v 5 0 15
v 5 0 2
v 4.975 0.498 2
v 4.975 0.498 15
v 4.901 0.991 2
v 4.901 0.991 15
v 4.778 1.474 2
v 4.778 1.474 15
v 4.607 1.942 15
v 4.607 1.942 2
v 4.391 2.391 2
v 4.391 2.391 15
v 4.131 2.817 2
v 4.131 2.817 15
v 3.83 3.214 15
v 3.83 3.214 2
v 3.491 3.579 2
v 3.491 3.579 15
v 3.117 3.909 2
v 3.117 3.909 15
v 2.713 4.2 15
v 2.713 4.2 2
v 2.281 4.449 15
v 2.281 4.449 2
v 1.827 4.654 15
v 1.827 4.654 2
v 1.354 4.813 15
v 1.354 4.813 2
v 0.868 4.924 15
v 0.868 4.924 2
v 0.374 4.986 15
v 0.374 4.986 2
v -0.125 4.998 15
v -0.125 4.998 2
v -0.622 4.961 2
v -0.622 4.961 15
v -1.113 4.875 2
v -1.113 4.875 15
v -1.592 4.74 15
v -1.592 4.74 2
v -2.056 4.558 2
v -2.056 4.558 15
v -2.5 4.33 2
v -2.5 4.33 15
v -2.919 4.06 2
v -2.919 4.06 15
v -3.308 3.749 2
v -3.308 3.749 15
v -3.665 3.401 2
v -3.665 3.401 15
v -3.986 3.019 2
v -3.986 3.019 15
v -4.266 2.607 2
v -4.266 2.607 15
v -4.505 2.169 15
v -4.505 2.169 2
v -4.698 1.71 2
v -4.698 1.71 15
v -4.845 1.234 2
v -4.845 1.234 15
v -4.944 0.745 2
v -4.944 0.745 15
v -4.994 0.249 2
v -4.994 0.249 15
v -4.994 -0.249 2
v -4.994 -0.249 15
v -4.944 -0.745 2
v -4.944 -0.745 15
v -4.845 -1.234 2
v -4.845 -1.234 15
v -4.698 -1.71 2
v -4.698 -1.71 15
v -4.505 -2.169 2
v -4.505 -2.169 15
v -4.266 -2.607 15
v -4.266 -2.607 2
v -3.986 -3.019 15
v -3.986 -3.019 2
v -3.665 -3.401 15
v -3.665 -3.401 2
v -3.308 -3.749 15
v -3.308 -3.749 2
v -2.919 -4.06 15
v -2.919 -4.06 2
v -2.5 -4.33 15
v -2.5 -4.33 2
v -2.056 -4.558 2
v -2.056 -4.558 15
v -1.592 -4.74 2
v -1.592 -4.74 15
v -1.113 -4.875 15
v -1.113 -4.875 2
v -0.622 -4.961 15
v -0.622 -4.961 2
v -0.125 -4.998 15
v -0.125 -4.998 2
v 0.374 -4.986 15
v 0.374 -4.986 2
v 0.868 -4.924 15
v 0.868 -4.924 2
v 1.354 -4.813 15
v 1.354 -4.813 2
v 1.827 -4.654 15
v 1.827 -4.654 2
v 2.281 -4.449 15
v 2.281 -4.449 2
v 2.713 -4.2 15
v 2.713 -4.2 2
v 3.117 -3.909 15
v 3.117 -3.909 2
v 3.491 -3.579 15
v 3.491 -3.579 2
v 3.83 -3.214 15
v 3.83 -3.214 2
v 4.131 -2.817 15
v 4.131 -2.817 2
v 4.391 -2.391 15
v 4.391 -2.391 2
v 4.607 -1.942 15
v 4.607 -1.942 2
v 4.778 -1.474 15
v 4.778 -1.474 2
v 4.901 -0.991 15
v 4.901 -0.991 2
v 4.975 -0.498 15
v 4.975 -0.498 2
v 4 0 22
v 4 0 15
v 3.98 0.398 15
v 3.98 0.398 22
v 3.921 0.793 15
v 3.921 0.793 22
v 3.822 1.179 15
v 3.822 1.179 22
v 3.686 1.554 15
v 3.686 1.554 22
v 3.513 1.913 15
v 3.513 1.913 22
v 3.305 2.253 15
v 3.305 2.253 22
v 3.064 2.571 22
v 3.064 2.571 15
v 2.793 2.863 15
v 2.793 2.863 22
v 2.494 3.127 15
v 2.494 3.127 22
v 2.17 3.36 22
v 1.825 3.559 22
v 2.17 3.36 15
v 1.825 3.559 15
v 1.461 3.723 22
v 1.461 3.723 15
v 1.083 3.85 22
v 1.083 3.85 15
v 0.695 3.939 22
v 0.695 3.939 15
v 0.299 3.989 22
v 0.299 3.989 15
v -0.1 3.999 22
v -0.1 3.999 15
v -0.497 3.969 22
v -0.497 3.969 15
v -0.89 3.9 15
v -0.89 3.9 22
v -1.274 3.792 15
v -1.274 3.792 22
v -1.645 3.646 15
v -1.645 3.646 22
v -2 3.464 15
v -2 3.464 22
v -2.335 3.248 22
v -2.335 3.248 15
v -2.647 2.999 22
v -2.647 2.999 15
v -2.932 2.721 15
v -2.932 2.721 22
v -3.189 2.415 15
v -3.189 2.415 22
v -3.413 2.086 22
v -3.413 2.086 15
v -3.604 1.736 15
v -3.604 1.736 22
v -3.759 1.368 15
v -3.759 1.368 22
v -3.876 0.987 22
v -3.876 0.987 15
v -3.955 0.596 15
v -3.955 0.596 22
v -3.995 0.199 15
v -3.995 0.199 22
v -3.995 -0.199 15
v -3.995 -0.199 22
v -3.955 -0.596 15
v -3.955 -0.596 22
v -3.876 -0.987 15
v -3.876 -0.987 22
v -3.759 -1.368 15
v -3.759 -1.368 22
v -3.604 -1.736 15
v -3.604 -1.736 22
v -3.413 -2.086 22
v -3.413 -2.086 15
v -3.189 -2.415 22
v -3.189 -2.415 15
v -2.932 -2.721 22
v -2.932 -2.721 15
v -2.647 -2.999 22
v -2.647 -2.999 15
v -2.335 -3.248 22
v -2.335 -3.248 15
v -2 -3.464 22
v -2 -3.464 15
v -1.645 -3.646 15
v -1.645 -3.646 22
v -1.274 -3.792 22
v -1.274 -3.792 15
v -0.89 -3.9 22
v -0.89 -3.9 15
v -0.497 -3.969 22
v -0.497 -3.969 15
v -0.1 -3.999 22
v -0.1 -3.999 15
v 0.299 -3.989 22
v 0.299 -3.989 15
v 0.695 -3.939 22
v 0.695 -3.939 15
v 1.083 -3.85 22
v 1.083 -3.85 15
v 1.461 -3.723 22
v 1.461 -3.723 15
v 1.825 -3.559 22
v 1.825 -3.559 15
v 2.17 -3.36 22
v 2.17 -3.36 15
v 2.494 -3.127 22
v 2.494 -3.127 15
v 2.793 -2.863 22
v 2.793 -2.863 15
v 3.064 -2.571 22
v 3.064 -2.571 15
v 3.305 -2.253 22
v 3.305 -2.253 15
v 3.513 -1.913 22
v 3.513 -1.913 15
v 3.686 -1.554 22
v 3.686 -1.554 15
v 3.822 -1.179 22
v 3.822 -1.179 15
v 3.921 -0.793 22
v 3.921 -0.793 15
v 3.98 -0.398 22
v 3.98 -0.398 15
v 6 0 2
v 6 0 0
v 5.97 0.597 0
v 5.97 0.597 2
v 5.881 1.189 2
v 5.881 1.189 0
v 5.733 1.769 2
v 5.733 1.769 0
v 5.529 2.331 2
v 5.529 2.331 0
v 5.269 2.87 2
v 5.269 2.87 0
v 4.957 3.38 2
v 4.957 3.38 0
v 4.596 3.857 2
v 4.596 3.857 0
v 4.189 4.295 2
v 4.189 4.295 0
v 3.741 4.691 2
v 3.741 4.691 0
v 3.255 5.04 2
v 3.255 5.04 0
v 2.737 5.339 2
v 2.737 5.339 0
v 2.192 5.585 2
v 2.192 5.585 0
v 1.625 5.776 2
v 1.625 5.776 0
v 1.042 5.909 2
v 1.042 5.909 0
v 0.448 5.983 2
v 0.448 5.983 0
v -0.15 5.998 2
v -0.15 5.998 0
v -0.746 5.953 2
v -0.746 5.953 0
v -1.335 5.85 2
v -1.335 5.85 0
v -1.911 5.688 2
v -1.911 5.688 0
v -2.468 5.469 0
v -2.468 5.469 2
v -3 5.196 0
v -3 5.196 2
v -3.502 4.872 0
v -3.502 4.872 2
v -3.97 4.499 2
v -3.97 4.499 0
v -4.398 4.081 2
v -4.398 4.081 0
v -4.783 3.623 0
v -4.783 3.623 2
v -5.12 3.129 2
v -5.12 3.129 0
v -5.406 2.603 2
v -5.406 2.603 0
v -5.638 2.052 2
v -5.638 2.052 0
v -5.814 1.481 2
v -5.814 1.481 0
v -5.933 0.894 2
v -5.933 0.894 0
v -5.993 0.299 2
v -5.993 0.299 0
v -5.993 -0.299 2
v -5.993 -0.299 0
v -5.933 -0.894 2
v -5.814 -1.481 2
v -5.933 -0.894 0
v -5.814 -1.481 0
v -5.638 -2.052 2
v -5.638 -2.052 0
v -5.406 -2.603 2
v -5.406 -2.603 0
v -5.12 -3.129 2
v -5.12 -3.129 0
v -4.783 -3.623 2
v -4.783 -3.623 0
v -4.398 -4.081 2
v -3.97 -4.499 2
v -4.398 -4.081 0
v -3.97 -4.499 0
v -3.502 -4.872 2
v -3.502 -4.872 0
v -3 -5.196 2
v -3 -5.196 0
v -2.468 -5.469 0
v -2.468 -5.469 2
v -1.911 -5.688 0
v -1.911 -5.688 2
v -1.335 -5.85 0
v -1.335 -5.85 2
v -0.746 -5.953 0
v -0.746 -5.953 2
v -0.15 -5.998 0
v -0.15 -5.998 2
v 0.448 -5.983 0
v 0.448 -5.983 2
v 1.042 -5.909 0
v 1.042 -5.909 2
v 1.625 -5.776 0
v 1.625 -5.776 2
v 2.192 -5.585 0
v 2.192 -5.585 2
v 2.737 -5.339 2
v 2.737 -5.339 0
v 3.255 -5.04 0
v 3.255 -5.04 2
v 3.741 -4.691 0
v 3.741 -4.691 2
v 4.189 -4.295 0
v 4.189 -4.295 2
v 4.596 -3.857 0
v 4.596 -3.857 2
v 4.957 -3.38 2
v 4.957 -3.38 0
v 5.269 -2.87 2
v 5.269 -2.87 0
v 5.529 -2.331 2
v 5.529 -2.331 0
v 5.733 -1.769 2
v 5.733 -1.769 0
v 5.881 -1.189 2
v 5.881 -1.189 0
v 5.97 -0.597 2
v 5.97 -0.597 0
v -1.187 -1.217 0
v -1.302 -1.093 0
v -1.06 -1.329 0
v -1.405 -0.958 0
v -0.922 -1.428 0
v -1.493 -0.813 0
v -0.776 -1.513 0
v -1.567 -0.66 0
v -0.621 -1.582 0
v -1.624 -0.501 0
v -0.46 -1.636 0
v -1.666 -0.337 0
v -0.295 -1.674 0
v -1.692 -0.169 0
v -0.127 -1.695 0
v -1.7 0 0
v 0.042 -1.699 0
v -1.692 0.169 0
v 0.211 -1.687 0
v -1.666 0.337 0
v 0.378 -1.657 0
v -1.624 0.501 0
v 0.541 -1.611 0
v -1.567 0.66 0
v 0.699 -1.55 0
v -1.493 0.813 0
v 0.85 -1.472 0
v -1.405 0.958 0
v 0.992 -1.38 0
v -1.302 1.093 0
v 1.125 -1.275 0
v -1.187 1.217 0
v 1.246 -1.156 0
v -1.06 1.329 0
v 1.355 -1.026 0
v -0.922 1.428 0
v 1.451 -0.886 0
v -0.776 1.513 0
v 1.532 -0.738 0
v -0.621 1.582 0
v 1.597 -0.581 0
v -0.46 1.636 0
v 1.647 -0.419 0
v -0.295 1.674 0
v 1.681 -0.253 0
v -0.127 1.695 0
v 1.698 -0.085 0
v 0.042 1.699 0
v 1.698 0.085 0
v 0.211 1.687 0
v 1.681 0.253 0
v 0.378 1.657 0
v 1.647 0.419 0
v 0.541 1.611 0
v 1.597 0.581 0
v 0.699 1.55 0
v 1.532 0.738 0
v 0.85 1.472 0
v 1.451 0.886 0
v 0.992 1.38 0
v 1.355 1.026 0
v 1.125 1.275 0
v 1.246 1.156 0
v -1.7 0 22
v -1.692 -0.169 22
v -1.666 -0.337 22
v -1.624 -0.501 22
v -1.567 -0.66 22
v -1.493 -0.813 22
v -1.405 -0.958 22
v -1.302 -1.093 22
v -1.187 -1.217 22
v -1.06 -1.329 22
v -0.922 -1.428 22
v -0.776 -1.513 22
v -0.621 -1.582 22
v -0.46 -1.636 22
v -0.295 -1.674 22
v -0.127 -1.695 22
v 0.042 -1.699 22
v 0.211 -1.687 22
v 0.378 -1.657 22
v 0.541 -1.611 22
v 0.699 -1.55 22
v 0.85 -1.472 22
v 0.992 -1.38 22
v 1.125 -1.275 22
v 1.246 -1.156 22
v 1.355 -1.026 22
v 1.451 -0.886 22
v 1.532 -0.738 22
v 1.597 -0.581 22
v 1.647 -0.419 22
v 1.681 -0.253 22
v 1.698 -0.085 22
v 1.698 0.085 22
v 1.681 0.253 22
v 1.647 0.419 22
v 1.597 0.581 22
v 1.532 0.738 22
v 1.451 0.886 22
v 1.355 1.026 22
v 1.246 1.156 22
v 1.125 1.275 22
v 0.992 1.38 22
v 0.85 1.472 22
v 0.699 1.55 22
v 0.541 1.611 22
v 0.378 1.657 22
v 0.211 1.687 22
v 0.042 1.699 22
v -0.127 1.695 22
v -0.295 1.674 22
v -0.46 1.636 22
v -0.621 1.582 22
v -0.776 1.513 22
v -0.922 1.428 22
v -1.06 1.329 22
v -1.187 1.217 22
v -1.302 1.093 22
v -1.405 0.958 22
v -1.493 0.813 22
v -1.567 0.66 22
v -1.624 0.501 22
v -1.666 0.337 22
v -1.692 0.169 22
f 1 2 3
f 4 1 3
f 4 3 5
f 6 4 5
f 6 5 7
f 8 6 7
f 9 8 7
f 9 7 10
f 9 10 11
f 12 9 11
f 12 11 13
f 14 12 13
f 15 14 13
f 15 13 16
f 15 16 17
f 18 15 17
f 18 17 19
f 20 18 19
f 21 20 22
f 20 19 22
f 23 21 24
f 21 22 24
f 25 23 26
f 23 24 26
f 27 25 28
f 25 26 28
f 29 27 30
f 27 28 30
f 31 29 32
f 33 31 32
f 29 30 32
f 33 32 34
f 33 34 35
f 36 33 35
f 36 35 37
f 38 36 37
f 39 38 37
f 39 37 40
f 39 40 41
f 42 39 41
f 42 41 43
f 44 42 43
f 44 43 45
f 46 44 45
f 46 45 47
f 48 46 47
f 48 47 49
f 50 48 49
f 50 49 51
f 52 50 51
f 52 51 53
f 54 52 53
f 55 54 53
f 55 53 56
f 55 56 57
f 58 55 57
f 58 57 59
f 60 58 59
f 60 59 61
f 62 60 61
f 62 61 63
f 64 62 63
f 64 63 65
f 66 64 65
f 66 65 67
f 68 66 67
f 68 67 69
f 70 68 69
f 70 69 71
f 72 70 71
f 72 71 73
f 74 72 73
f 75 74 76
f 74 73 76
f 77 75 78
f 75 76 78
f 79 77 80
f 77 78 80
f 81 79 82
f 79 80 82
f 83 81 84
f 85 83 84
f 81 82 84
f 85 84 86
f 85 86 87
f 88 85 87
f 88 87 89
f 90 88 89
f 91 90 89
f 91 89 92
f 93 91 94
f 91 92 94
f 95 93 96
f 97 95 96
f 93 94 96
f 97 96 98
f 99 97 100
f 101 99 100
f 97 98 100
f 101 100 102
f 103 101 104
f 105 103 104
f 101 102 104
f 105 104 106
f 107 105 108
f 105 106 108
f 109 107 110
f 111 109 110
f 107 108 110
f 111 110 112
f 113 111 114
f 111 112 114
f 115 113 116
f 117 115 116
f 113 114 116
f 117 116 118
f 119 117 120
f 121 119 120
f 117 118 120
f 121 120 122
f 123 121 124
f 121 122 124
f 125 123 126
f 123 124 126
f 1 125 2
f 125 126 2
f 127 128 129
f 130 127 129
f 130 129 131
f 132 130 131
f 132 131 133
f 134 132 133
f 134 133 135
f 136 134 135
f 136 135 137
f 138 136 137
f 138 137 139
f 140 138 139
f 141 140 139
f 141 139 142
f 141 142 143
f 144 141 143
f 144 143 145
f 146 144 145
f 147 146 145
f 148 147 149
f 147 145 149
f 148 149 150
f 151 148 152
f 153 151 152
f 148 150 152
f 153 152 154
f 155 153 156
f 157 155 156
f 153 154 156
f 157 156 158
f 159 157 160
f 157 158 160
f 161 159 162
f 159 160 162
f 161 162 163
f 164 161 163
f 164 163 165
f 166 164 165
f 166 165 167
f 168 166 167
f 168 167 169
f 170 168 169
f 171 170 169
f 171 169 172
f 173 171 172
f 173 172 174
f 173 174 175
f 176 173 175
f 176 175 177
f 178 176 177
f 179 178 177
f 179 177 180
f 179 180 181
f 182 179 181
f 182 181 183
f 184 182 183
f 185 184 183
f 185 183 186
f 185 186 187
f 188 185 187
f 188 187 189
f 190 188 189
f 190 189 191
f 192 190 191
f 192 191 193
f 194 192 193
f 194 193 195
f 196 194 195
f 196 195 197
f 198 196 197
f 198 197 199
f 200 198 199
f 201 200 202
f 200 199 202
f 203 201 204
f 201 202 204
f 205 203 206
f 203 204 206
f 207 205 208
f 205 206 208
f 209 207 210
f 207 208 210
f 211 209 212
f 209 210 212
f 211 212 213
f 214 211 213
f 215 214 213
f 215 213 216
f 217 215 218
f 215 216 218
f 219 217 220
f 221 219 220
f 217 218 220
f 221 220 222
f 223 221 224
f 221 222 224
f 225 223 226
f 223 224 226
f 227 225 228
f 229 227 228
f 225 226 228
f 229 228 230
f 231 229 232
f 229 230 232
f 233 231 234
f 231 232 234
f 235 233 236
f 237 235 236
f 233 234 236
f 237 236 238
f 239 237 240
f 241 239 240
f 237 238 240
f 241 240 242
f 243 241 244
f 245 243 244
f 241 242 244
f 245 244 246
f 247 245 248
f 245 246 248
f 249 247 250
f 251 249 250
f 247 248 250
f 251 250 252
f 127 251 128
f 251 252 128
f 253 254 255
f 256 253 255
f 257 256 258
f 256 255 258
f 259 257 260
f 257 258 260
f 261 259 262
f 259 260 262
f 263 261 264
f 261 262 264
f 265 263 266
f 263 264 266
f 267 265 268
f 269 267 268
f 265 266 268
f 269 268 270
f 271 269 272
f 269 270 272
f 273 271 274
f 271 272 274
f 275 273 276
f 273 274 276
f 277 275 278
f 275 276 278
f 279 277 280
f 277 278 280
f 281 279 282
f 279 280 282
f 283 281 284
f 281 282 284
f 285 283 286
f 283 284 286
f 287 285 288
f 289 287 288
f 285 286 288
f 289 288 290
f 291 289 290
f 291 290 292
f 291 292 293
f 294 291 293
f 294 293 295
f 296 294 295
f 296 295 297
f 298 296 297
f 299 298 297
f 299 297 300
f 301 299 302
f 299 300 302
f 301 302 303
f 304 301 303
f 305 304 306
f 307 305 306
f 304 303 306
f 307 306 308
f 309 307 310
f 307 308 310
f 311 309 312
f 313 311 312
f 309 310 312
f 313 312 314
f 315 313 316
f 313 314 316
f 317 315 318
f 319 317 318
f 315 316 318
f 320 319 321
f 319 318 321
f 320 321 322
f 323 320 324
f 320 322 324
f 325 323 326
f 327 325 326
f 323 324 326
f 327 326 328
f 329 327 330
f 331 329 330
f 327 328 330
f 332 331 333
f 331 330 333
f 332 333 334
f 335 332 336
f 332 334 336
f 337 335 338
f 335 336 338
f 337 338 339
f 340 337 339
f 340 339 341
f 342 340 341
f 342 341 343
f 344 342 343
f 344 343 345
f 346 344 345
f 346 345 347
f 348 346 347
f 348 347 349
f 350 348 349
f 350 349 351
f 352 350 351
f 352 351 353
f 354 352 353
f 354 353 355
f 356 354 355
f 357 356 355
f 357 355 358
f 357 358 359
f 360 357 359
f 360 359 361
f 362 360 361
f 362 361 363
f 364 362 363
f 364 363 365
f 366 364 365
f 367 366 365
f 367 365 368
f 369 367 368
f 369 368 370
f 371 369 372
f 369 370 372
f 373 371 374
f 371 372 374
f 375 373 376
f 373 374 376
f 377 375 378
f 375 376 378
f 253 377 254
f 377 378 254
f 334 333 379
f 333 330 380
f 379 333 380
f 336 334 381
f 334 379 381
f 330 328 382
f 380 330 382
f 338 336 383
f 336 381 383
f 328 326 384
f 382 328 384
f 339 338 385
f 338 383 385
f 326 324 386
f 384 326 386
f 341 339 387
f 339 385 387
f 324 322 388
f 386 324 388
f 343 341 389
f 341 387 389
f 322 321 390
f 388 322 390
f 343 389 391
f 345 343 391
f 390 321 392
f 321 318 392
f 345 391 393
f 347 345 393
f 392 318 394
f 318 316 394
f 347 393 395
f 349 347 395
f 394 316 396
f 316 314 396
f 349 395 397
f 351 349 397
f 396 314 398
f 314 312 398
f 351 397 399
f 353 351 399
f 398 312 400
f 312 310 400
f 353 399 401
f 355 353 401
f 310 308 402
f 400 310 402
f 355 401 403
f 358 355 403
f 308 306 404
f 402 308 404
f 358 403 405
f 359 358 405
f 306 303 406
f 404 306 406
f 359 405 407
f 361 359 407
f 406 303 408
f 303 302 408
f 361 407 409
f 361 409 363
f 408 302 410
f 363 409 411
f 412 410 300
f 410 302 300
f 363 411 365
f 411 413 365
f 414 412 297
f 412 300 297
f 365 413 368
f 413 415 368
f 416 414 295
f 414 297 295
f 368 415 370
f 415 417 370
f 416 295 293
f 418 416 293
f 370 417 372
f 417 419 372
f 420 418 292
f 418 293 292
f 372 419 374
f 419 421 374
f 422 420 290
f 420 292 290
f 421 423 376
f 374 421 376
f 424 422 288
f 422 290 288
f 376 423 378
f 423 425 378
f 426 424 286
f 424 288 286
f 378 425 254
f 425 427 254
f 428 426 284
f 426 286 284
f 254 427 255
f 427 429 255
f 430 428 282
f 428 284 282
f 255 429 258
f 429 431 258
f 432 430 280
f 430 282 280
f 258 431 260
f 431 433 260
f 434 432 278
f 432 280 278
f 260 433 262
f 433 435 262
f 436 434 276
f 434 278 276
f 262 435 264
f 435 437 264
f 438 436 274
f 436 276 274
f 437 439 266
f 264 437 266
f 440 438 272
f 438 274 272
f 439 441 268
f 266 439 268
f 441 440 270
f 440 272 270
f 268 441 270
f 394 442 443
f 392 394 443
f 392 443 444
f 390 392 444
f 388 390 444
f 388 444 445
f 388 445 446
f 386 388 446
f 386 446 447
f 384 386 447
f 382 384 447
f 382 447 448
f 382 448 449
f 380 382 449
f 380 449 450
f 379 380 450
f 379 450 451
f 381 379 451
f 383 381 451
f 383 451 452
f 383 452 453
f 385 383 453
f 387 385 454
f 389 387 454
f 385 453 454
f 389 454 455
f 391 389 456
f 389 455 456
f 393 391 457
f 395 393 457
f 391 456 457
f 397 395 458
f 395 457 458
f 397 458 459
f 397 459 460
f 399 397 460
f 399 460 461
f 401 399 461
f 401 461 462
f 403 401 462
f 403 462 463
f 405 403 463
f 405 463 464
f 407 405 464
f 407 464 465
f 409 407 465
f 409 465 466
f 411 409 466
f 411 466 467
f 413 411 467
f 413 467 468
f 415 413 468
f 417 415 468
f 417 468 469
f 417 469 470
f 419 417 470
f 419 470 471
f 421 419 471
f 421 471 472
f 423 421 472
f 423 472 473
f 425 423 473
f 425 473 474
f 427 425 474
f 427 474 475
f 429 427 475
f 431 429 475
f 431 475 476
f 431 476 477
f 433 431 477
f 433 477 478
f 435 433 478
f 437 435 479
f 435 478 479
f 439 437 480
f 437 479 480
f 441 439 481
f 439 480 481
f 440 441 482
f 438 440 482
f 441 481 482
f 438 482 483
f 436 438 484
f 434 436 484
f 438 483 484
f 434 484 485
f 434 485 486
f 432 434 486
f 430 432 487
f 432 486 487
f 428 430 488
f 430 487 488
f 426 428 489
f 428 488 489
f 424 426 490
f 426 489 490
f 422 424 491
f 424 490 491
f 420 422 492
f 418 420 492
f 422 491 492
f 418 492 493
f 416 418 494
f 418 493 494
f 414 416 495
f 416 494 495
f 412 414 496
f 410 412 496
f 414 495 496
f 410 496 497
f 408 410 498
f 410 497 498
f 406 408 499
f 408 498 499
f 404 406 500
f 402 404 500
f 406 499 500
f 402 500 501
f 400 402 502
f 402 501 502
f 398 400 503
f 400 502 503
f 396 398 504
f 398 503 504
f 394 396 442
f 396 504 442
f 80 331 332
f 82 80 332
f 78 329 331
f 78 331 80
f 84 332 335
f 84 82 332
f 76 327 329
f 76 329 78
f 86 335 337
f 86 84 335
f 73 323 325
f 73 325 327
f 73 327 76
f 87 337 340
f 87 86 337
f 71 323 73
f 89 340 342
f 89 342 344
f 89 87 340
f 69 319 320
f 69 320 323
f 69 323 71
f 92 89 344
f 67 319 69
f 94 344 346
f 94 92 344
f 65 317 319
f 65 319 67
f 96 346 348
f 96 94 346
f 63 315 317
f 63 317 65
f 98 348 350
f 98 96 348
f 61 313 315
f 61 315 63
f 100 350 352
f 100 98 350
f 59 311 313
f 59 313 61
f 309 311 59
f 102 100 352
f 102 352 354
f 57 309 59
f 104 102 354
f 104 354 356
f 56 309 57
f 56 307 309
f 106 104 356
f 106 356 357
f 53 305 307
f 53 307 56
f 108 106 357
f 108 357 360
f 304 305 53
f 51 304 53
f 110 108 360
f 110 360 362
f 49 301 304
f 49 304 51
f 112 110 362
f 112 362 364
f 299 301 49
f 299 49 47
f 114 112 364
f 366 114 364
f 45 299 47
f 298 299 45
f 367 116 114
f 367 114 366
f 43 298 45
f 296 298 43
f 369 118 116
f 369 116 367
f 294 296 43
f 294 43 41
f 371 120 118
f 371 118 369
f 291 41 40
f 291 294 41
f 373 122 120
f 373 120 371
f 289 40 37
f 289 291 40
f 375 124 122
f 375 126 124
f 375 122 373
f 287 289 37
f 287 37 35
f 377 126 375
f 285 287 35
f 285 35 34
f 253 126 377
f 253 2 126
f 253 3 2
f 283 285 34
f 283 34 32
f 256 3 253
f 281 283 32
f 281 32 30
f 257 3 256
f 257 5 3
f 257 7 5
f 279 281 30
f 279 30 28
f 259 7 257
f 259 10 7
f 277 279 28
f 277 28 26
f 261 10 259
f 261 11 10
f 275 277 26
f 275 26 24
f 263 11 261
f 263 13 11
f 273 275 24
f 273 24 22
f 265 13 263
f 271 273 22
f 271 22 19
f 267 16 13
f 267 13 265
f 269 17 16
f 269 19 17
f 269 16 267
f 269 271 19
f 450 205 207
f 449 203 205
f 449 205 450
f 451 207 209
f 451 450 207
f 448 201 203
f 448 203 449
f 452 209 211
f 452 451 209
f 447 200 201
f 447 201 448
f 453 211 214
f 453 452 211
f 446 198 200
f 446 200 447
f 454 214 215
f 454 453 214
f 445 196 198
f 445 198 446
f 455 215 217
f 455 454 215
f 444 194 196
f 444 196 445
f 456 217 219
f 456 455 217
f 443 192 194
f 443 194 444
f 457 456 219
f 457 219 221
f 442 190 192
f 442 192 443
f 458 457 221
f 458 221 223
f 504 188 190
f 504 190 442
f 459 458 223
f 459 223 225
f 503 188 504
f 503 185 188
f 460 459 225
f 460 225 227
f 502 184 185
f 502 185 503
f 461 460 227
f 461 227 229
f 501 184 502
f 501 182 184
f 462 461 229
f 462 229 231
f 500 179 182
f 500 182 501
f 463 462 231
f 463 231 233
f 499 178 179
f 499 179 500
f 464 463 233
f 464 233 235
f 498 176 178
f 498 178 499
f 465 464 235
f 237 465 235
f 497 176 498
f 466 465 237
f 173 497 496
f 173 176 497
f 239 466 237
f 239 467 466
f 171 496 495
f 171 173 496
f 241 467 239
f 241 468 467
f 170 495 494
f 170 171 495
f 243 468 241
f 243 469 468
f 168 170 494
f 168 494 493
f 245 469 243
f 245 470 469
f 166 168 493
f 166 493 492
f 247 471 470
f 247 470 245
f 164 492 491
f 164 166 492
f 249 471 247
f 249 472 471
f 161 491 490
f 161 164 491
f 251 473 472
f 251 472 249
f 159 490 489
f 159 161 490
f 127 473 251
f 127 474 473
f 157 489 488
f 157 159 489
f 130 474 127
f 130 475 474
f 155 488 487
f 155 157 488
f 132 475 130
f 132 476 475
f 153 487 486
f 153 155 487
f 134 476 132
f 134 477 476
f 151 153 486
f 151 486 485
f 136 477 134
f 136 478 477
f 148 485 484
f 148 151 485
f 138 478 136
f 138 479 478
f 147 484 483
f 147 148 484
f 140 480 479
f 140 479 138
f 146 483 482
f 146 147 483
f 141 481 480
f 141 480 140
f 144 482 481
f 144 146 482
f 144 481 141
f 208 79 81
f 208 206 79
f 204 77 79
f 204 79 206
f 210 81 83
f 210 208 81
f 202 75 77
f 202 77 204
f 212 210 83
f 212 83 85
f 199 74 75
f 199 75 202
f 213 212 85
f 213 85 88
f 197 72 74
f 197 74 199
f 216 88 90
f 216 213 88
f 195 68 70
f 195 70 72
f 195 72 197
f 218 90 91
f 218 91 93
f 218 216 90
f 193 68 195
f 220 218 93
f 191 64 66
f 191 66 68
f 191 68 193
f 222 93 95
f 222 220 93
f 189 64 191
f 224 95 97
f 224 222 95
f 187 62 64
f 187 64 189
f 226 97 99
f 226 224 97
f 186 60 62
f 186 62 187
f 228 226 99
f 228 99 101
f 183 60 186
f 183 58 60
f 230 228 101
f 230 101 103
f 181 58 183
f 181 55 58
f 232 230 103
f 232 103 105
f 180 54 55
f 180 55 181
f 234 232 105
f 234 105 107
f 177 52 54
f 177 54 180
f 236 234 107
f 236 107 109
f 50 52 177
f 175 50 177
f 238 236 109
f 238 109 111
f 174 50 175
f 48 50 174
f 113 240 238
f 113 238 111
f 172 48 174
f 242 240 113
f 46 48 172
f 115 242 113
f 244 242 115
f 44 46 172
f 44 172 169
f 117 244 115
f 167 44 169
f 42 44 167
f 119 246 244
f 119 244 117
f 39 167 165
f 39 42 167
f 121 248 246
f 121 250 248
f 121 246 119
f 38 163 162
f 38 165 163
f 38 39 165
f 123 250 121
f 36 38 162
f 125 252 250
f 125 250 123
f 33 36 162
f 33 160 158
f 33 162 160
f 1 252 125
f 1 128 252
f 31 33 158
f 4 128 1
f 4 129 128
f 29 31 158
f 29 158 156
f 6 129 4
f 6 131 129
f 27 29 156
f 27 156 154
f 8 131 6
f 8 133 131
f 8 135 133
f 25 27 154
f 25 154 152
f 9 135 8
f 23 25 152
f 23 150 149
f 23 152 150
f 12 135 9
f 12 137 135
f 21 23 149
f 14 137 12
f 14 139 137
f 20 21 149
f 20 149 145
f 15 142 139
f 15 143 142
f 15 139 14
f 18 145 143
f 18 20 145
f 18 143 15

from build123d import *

# Parameters (mm, degrees)
F0_R     = 4
F1_DEPTH = 22
F0_R_2   = 5
F2_DEPTH = 15
F0_R_3   = 6
F3_DEPTH = 2
F4_D     = 3.4


with BuildPart() as f1:
    # F0 (on Top) → F1 (new body)
    with BuildSketch(Plane.XY):
        Circle(F0_R)
    extrude(amount=F1_DEPTH)

    # F0 (on Top) → F2 (join)
    with BuildSketch(Plane.XY):
        Circle(F0_R_2)
        Circle(F0_R, mode=Mode.SUBTRACT)
    extrude(amount=F2_DEPTH)

    # F0 (on Top) → F3 (join)
    with BuildSketch(Plane.XY):
        Circle(F0_R_3)
        Circle(F0_R_2, mode=Mode.SUBTRACT)
    extrude(amount=F3_DEPTH)

    # F4 (through all)
    with Locations(Plane(origin=(0, 0, 0), x_dir=(1, 0, 0), z_dir=(0, 0, -1))):
        with Locations((0, 0)):
            Hole(F4_D / 2)


solid = f1.part
